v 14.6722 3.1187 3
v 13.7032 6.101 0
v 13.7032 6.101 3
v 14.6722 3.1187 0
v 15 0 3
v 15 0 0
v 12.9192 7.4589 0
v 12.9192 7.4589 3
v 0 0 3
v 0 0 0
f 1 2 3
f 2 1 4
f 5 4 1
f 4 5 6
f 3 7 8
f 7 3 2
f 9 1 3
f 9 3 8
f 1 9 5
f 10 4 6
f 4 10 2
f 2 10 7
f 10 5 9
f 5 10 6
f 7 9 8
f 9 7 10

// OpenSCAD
toleranta=1;//toleranta la desenare


module felie_pizza_diference(diametru,grosime,unghi_felie)
{
    
    difference(){
    cylinder(h=grosime,r=diametru/2);
   translate([-diametru/2-toleranta,-diametru/2-toleranta,-toleranta]) cube([diametru+2*toleranta, diametru/2+toleranta,grosime+2*toleranta]);       
  rotate([0,0,30]) translate([-diametru/2-toleranta,0,-toleranta]) cube([diametru+2*toleranta, diametru/2+toleranta,grosime+2*toleranta]);   
    }
}    
    
    
felie_pizza_diference(diametru=30,grosime=3,unghi_felie=30);
    
    
